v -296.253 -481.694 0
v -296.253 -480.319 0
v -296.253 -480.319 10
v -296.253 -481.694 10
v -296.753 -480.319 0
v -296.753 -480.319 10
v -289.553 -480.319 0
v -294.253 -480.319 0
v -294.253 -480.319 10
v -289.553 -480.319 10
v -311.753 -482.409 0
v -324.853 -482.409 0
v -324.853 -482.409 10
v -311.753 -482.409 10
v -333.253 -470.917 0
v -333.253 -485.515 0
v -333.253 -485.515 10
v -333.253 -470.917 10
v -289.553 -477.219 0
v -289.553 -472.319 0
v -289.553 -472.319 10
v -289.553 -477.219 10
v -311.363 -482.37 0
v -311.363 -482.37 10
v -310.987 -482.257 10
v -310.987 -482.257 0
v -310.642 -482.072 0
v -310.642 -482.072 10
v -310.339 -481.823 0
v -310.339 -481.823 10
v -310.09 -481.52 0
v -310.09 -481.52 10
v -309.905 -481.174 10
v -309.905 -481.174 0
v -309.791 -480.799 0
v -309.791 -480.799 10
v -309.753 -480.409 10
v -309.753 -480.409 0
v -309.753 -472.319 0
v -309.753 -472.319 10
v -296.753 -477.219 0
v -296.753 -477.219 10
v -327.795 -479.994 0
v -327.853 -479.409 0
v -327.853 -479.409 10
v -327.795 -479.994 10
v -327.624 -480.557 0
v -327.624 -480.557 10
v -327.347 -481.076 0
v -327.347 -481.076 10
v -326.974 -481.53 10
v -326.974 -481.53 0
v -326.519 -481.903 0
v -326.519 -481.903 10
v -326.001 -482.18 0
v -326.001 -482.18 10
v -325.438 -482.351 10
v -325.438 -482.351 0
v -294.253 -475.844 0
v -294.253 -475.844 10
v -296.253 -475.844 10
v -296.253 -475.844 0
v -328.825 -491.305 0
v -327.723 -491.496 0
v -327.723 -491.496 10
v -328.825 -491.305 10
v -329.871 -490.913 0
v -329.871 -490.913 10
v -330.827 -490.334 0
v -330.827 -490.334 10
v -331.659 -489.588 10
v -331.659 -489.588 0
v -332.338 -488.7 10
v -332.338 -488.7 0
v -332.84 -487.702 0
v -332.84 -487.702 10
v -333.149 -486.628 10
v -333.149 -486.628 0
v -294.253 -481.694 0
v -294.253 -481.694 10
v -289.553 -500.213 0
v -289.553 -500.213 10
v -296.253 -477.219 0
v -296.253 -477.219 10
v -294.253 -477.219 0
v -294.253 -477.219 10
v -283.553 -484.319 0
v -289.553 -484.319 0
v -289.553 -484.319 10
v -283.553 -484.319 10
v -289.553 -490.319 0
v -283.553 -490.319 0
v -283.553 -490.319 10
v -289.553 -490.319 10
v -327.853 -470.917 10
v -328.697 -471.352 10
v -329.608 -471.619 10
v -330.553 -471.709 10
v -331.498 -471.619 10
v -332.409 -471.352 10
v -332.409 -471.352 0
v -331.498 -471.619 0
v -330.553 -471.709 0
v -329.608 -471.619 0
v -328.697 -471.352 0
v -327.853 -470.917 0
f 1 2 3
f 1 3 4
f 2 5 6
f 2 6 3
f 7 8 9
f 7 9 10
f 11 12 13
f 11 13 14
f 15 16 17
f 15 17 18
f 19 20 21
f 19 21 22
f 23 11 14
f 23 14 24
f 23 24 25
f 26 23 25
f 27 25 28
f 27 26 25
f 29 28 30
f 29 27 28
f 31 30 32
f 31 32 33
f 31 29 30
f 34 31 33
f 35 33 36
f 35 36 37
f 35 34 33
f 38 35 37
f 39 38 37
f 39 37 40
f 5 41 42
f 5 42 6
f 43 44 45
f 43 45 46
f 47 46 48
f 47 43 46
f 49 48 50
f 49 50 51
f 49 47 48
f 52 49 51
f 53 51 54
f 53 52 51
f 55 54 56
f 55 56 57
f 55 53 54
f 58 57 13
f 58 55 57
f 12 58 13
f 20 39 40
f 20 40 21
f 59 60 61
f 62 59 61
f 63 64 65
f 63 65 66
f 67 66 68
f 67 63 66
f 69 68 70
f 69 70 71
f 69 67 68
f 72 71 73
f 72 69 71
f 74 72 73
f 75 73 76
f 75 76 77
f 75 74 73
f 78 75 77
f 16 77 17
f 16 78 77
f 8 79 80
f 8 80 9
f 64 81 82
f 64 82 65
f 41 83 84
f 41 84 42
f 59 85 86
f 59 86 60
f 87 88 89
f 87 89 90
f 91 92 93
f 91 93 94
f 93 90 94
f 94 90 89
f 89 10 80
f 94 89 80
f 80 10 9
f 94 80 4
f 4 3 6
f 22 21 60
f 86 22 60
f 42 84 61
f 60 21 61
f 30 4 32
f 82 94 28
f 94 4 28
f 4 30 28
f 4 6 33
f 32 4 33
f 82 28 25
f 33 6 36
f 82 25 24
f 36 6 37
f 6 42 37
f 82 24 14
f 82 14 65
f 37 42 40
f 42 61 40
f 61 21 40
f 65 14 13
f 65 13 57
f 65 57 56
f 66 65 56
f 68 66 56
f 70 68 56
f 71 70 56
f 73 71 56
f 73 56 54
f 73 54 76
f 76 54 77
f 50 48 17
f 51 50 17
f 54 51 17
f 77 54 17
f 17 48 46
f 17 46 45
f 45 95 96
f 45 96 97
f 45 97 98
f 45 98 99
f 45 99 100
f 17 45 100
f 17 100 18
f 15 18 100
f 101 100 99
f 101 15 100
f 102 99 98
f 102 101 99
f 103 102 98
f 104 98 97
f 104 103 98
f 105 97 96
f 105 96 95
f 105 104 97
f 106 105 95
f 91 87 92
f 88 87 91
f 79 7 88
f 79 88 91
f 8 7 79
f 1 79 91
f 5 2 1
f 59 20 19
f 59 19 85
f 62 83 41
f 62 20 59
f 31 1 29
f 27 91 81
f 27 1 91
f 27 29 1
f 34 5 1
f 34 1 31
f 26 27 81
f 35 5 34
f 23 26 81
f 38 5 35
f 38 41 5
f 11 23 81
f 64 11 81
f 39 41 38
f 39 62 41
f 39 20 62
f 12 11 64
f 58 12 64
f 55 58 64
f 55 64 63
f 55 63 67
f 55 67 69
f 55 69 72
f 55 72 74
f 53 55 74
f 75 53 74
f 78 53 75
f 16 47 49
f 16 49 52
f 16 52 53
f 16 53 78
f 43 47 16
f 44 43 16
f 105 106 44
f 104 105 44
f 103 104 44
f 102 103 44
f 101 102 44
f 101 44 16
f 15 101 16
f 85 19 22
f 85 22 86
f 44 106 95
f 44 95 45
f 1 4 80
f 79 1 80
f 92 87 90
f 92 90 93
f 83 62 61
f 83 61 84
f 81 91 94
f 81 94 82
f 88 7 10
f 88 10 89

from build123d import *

# Parameters (mm, degrees)
DODANIE_WYCI_GNI_CIE1_DEPTH = 10


with BuildPart() as part:
    # Szkic1 → Dodanie-wyciągnięcie1 (new body)
    with BuildSketch(Plane.XY):
        with BuildLine():
            Line((-327.852783983, -473.3081849), (-327.852783983, -478.408833405))
            Line((-327.852783983, -478.408833405), (-327.852783983, -479.408833405))
            ThreePointArc((-327.852783983, -479.408833405), (-326.974104327, -481.530153749), (-324.852783983, -482.408833405))
            Line((-324.852783983, -482.408833405), (-320.102783983, -482.408833405))
            Line((-320.102783983, -482.408833405), (-311.752783983, -482.408833405))
            ThreePointArc((-311.752783983, -482.408833405), (-310.338570421, -481.823046968), (-309.752783983, -480.408833405))
            Line((-309.752783983, -480.408833405), (-309.752783983, -472.318864182))
            Line((-309.752783983, -472.318864182), (-300.552783983, -472.318864182))
            Line((-300.552783983, -472.318864182), (-289.552783983, -472.318864182))
            Line((-289.552783983, -472.318864182), (-289.552783983, -477.218864182))
            Line((-289.552783983, -477.218864182), (-294.252783983, -477.218864182))
            Line((-294.252783983, -477.218864182), (-294.252783983, -475.843864182))
            Line((-294.252783983, -475.843864182), (-296.252783983, -475.843864182))
            Line((-296.252783983, -475.843864182), (-296.252783983, -477.218864182))
            Line((-296.252783983, -477.218864182), (-296.752783983, -477.218864182))
            Line((-296.752783983, -477.218864182), (-296.752783983, -480.318864182))
            Line((-296.752783983, -480.318864182), (-296.252783983, -480.318864182))
            Line((-296.252783983, -480.318864182), (-296.252783983, -481.693864182))
            Line((-296.252783983, -481.693864182), (-294.252783983, -481.693864182))
            Line((-294.252783983, -481.693864182), (-294.252783983, -480.318864182))
            Line((-294.252783983, -480.318864182), (-289.552783983, -480.318864182))
            Line((-289.552783983, -480.318864182), (-289.552783983, -484.318864182))
            Line((-289.552783983, -484.318864182), (-283.552783983, -484.318864182))
            Line((-283.552783983, -484.318864182), (-283.552783983, -490.318864182))
            Line((-283.552783983, -490.318864182), (-289.552783983, -490.318864182))
            Line((-289.552783983, -490.318864182), (-289.552783983, -494.315935469))
            Line((-289.552783983, -494.315935469), (-289.552783983, -500.21329504))
            Line((-289.552783983, -500.21329504), (-327.723397777, -491.496448064))
            ThreePointArc((-327.723397777, -491.496448064), (-331.658671111, -489.587789306), (-333.252783983, -485.514932984))
            Line((-333.252783983, -485.514932984), (-333.252783983, -470.917158488))
            ThreePointArc((-333.252783983, -470.917158488), (-330.552783983, -471.708833405), (-327.852783983, -470.917158488))
            Line((-327.852783983, -470.917158488), (-327.852783983, -473.3081849))
        make_face()
    extrude(amount=DODANIE_WYCI_GNI_CIE1_DEPTH)


solid = part.part
